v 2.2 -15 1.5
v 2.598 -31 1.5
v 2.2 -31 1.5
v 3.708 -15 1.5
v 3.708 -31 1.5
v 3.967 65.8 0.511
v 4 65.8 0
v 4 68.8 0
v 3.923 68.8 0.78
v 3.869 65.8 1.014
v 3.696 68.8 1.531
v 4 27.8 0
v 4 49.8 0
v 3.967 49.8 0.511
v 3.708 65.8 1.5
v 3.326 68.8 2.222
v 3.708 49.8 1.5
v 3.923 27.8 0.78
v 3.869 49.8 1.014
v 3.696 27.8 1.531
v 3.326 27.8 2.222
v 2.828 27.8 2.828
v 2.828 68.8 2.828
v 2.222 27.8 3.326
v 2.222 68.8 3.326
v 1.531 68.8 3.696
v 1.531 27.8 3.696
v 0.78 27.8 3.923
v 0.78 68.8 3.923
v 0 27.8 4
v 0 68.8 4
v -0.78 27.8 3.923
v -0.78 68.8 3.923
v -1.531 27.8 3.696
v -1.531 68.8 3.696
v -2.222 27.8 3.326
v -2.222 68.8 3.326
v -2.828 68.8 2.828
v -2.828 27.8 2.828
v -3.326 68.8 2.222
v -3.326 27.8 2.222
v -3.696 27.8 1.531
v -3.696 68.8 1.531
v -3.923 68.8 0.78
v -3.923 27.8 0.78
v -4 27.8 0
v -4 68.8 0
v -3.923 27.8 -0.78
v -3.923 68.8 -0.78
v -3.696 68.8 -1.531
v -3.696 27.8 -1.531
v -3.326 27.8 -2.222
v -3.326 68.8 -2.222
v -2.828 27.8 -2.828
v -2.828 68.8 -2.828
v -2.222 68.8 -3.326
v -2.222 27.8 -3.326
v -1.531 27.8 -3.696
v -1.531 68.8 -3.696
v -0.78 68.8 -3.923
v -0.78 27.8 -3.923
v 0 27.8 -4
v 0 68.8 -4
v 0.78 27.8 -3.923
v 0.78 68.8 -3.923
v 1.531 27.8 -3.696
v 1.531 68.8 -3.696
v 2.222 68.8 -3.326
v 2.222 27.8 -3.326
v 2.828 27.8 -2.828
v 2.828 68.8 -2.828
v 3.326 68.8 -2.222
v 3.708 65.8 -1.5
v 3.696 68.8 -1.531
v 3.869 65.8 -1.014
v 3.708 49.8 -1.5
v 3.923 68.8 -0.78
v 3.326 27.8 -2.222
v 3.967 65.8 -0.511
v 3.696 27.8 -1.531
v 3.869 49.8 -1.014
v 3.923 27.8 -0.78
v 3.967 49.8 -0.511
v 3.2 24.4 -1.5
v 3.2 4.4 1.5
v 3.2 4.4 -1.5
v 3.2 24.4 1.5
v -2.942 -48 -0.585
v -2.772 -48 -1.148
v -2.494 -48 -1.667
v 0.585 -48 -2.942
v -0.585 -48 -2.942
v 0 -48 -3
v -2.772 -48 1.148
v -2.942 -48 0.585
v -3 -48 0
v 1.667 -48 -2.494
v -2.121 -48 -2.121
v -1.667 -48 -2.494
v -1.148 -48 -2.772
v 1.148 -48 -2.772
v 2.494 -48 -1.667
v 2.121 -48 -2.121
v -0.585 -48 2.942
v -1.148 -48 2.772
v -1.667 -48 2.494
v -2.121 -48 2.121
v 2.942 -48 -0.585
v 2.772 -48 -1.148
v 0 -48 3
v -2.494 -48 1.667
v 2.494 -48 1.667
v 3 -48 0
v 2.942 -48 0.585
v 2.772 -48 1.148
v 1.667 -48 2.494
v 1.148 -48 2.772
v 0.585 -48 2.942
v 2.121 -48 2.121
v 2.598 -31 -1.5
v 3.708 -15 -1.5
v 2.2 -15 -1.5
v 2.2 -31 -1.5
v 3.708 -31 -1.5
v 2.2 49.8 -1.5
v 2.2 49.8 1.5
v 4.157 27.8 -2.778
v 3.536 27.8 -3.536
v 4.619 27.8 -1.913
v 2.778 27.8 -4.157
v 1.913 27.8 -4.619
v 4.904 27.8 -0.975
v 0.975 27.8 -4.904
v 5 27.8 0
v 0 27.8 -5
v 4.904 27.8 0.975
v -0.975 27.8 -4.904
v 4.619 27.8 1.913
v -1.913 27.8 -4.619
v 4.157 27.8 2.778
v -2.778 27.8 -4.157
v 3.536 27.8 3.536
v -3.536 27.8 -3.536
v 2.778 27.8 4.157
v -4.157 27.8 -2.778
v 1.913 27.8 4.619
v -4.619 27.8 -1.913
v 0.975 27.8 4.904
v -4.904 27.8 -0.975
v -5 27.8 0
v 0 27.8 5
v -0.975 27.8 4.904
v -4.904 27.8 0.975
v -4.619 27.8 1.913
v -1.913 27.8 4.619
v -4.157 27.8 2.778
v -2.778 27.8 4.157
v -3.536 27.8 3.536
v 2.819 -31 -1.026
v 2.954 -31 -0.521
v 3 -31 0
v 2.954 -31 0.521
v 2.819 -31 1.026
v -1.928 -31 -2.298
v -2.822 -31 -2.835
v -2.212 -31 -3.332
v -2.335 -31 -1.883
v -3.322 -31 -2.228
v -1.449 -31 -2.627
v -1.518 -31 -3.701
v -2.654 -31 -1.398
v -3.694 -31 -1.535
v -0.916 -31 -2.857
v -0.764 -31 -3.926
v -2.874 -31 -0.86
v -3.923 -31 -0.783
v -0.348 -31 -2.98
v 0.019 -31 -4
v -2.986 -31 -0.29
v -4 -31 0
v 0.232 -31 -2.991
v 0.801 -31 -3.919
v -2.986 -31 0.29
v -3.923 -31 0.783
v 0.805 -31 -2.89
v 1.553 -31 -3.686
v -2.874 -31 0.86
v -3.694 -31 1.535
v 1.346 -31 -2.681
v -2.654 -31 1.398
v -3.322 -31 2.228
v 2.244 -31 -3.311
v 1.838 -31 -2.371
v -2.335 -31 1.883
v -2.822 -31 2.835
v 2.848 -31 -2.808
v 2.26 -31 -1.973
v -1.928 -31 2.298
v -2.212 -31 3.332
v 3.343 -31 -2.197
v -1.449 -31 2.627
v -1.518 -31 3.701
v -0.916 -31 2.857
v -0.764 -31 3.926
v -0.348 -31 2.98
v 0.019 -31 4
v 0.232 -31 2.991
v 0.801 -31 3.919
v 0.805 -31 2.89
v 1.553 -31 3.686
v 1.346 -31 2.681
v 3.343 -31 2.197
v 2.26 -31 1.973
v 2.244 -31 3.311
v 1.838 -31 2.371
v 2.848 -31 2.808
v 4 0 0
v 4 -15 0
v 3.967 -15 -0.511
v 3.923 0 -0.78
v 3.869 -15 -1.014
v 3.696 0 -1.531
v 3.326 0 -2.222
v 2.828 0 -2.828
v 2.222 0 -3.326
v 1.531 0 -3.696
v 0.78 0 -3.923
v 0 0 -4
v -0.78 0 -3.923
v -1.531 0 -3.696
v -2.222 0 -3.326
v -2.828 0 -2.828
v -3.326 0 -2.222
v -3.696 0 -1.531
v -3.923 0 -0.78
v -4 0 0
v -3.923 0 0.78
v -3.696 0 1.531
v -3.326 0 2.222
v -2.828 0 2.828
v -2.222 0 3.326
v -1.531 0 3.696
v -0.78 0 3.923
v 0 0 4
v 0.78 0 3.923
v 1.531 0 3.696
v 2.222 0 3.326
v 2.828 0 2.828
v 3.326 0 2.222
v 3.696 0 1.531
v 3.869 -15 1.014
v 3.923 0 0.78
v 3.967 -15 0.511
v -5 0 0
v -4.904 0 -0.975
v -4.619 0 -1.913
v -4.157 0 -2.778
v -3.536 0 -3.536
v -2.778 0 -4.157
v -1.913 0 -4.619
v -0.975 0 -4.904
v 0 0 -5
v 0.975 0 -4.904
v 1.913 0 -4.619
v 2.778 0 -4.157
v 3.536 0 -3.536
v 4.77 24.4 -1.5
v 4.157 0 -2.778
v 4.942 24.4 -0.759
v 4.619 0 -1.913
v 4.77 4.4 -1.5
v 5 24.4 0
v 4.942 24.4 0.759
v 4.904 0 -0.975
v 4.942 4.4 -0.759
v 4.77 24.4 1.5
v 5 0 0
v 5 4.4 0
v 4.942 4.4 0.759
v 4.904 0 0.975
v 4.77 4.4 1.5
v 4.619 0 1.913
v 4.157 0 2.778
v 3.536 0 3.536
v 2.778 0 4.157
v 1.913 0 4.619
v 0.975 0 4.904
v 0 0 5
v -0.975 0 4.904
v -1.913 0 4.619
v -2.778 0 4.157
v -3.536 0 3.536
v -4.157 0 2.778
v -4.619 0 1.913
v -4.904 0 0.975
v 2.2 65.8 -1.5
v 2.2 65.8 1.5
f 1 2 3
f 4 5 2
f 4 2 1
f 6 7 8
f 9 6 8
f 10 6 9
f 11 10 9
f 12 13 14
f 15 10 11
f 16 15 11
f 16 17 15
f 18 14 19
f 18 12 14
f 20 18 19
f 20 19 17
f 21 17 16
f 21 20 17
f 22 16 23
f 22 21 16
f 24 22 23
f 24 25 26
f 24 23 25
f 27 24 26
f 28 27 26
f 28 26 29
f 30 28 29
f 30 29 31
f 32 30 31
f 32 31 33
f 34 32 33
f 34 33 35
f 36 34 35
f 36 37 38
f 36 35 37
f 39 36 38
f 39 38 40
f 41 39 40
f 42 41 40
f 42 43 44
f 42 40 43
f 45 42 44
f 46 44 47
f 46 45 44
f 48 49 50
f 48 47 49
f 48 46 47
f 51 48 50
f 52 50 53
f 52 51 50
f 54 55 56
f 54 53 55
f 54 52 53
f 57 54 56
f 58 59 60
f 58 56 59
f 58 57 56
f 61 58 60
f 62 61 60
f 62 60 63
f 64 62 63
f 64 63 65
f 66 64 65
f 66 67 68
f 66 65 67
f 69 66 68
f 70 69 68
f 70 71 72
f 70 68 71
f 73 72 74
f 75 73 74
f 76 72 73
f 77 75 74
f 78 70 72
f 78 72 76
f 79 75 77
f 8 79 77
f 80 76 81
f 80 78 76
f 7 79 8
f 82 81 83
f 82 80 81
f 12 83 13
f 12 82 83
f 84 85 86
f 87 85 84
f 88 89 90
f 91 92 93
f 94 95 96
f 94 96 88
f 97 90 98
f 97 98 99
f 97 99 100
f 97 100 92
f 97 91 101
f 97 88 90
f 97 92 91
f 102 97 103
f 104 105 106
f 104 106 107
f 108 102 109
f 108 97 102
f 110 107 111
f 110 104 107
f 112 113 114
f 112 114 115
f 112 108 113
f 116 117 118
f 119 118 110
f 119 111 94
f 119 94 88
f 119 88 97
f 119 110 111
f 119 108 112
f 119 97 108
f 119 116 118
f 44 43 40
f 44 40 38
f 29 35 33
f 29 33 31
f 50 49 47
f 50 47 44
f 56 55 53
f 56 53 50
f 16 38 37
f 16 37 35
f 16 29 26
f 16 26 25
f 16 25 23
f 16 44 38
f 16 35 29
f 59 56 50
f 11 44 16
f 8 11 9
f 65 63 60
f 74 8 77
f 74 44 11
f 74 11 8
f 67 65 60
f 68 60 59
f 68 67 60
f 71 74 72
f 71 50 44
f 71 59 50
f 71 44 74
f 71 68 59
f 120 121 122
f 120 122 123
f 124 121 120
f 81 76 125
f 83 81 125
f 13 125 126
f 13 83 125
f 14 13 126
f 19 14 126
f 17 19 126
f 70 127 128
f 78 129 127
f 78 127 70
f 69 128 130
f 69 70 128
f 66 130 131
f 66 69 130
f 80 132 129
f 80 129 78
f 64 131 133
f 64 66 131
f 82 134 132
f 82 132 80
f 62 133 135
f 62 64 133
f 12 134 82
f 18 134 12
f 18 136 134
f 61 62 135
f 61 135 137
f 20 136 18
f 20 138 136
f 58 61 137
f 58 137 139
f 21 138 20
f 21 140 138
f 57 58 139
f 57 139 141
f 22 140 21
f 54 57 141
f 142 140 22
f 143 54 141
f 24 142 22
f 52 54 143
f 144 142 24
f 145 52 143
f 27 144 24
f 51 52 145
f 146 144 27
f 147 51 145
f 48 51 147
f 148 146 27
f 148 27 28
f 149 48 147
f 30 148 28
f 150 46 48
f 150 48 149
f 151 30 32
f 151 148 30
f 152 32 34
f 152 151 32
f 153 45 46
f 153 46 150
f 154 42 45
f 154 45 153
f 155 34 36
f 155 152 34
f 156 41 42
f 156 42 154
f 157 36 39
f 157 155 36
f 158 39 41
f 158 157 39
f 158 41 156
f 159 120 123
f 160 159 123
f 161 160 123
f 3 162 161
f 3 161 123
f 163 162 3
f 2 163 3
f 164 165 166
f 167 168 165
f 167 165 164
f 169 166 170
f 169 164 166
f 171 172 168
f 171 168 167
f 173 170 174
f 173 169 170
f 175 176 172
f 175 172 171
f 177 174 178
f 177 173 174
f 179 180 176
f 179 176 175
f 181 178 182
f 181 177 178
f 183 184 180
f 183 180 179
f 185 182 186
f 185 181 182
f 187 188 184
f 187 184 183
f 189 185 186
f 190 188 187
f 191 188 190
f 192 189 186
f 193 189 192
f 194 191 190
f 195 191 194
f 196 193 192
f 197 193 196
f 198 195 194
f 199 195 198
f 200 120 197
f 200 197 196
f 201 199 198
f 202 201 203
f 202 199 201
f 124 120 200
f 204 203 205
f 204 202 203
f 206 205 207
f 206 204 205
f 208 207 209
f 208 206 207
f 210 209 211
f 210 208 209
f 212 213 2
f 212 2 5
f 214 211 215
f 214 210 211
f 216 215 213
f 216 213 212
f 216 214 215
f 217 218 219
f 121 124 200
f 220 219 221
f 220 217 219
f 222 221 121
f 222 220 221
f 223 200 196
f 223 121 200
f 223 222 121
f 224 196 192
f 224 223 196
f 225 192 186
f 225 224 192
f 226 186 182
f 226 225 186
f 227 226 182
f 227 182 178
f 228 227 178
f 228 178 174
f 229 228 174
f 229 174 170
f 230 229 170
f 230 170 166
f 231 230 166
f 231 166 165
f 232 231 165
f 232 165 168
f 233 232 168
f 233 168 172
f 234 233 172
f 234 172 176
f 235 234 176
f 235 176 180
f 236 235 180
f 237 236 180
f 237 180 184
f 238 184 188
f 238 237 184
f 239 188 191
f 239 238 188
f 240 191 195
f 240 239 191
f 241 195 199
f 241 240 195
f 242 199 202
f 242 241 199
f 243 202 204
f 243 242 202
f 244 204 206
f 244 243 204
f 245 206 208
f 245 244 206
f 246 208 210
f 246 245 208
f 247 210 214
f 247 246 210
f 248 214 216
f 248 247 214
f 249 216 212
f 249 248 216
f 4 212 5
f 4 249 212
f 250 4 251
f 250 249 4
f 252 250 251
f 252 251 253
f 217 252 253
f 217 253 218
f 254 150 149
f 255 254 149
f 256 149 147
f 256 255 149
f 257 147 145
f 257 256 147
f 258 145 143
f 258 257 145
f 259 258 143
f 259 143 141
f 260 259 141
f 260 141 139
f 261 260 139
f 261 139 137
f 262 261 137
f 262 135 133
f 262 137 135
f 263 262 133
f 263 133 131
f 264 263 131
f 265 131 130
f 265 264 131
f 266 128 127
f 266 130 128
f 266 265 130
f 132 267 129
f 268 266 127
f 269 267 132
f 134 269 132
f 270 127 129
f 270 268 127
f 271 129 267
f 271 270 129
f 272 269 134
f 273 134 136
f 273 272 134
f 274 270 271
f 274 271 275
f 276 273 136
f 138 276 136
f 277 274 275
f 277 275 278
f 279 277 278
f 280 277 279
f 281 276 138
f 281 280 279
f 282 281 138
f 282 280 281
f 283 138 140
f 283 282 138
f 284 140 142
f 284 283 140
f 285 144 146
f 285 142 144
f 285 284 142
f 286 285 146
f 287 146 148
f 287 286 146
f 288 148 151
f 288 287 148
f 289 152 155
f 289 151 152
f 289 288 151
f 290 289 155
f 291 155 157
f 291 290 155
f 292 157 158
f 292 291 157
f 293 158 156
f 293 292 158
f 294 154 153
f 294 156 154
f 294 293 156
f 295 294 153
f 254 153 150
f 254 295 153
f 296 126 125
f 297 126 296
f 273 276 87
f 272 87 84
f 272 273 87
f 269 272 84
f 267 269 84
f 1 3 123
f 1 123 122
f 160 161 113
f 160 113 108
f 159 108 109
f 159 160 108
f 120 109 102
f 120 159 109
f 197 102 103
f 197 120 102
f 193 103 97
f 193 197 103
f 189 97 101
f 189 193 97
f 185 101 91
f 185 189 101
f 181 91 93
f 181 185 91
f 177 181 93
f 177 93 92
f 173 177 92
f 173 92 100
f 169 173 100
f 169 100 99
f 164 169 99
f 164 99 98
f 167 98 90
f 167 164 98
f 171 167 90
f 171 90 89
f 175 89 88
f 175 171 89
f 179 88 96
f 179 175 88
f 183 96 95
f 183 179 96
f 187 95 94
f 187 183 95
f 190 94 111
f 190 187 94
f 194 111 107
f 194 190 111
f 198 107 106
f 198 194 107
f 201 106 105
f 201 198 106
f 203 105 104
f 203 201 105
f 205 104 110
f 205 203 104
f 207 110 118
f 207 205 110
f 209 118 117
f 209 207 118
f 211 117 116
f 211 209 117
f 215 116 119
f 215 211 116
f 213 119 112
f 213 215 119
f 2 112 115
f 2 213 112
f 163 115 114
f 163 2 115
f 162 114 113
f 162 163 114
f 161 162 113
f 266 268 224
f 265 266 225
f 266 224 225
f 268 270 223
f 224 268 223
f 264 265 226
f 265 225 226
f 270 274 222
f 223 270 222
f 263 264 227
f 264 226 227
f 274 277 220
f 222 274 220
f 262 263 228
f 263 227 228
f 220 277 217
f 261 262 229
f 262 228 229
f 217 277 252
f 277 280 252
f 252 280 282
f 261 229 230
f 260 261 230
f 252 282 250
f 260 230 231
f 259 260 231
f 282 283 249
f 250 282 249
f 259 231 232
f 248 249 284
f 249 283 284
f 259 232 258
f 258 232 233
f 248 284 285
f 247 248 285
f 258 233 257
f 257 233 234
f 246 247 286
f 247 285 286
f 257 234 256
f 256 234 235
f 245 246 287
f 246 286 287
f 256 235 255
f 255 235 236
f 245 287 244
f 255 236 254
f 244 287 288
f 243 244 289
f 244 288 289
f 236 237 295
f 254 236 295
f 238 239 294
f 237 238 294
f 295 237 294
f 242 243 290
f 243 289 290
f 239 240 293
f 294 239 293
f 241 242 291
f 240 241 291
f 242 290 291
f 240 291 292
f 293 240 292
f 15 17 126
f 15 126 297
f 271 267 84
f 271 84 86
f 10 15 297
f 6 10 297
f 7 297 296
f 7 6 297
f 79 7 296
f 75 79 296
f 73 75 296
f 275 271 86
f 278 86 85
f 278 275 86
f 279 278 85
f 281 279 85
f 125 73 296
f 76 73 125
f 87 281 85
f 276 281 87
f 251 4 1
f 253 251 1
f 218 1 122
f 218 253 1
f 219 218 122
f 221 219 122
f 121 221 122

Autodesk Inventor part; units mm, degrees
ref_plane "YZ Plane" through (0, 0, 0) normal (1, 0, 0) x (0, 1, 0)
ref_plane "XZ Plane" through (0, 0, 0) normal (0, 1, 0) x (-1, 0, 0)
sketch "スケッチ1" plane through (0, 0, 0) normal (0, 1, 0) x (-1, 0, 0)
  circle A0 centre (0, 0) radius 5
  dimension "d0" = 10
extrude "押し出し1" add sketch "スケッチ1" along normal blind 27.8
sketch "スケッチ2" plane through (0, 27.8, 0) normal (0, 1, 0) x (1, 0, 0)
  circle A0 centre (0, 0) radius 4
  dimension "d3" = 8
extrude "押し出し2" add sketch "スケッチ2" along normal blind 41
sketch "スケッチ3" plane through (0, 68.8, 0) normal (0, 1, 0) x (1, 0, 0)
  circle A0 centre (0, 0) radius 3
  dimension "d6" = 6
extrude "押し出し3" [suppressed]
sketch "スケッチ4" plane through (0, 0, 0) normal (0, -1, 0) x (1, 0, 0)
  circle A0 centre (0, 0) radius 4 projected
  circle A1 centre (0, 0) radius 4
  dimension "d9" = 8
extrude "押し出し4" add sketch "スケッチ4" along normal blind 31
sketch "スケッチ5" plane through (0, -31, 0) normal (0, -1, 0) x (1, 0, 0)
  circle A0 centre (0, 0) radius 4 projected
  circle A1 centre (0, 0) radius 3
  dimension "d12" = 6
extrude "押し出し5" add sketch "スケッチ5" along normal blind 17 contours A1
sketch "スケッチ6" plane through (0, 0, 0) normal (0, -1, 0) x (1, 0, 0)
  circle A0 centre (0, 0) radius 5 projected
  point P0 (5, 0)
ref_plane "作業平面1" through (5, 0, 0) normal (1, 0, 0) x (0, 1, 0)
sketch "スケッチ7" plane through (5, 0, 0) normal (1, 0, 0) x (0, 1, 0)
  line L0 (4.4, 1.5) -> (24.4, 1.5)
  line L1 (24.4, 1.5) -> (24.4, -1.5)
  line L2 (24.4, -1.5) -> (4.4, -1.5)
  line L3 (4.4, -1.5) -> (4.4, 1.5)
  line L4 (4.4, 1.5) -> (24.4, -1.5) construction
  line L5 (24.4, 1.5) -> (4.4, -1.5) construction
  line L6 (0, -5) -> (0, 5) projected
  point P0 (0, 0)
  point P1 (14.4, 0)
  dimension "d15" = 20
  dimension "d16" = 3
  dimension "d17" = 4.4
extrude "押し出し6" cut sketch "スケッチ7" against normal blind 1.8
sketch "スケッチ8" plane through (5, 0, 0) normal (1, 0, 0) x (0, 1, 0)
  point P0 (0, 0)
sketch "スケッチ9" plane through (5, 0, 0) normal (1, 0, 0) x (0, 1, 0)
  point P0 (0, 0)
ref_plane "作業平面2" through (4, 0, 0) normal (1, 0, 0) x (0, 1, 0)
sketch "スケッチ10" plane through (4, 0, 0) normal (1, 0, 0) x (0, 1, 0)
  line L0 (49.8, 1.5) -> (65.8, 1.5)
  line L1 (65.8, 1.5) -> (65.8, -1.5)
  line L2 (65.8, -1.5) -> (49.8, -1.5)
  line L3 (49.8, -1.5) -> (49.8, 1.5)
  line L4 (49.8, 1.5) -> (65.8, -1.5) construction
  line L5 (65.8, 1.5) -> (49.8, -1.5) construction
  line L6 (-31, 1.5) -> (-15, 1.5)
  line L7 (-15, 1.5) -> (-15, -1.5)
  line L8 (-15, -1.5) -> (-31, -1.5)
  line L9 (-31, -1.5) -> (-31, 1.5)
  line L10 (-31, 1.5) -> (-15, -1.5) construction
  line L11 (-15, 1.5) -> (-31, -1.5) construction
  line L12 (-31, 4) -> (-31, -4) projected
  line L13 (68.8, -4) -> (68.8, 4) projected
  point P0 (0, 0)
  point P1 (57.8, 0)
  point P2 (-23, 0)
  dimension "d21" = 16
  dimension "d22" = 3
  dimension "d23" = 16
  dimension "d24" = 3
  dimension "d25" = 0
  dimension "d26" = 3
extrude "押し出し8" cut sketch "スケッチ10" against normal blind 1.8
properties part number "shoulder1_shaft" material "鋼、炭素鋼"
